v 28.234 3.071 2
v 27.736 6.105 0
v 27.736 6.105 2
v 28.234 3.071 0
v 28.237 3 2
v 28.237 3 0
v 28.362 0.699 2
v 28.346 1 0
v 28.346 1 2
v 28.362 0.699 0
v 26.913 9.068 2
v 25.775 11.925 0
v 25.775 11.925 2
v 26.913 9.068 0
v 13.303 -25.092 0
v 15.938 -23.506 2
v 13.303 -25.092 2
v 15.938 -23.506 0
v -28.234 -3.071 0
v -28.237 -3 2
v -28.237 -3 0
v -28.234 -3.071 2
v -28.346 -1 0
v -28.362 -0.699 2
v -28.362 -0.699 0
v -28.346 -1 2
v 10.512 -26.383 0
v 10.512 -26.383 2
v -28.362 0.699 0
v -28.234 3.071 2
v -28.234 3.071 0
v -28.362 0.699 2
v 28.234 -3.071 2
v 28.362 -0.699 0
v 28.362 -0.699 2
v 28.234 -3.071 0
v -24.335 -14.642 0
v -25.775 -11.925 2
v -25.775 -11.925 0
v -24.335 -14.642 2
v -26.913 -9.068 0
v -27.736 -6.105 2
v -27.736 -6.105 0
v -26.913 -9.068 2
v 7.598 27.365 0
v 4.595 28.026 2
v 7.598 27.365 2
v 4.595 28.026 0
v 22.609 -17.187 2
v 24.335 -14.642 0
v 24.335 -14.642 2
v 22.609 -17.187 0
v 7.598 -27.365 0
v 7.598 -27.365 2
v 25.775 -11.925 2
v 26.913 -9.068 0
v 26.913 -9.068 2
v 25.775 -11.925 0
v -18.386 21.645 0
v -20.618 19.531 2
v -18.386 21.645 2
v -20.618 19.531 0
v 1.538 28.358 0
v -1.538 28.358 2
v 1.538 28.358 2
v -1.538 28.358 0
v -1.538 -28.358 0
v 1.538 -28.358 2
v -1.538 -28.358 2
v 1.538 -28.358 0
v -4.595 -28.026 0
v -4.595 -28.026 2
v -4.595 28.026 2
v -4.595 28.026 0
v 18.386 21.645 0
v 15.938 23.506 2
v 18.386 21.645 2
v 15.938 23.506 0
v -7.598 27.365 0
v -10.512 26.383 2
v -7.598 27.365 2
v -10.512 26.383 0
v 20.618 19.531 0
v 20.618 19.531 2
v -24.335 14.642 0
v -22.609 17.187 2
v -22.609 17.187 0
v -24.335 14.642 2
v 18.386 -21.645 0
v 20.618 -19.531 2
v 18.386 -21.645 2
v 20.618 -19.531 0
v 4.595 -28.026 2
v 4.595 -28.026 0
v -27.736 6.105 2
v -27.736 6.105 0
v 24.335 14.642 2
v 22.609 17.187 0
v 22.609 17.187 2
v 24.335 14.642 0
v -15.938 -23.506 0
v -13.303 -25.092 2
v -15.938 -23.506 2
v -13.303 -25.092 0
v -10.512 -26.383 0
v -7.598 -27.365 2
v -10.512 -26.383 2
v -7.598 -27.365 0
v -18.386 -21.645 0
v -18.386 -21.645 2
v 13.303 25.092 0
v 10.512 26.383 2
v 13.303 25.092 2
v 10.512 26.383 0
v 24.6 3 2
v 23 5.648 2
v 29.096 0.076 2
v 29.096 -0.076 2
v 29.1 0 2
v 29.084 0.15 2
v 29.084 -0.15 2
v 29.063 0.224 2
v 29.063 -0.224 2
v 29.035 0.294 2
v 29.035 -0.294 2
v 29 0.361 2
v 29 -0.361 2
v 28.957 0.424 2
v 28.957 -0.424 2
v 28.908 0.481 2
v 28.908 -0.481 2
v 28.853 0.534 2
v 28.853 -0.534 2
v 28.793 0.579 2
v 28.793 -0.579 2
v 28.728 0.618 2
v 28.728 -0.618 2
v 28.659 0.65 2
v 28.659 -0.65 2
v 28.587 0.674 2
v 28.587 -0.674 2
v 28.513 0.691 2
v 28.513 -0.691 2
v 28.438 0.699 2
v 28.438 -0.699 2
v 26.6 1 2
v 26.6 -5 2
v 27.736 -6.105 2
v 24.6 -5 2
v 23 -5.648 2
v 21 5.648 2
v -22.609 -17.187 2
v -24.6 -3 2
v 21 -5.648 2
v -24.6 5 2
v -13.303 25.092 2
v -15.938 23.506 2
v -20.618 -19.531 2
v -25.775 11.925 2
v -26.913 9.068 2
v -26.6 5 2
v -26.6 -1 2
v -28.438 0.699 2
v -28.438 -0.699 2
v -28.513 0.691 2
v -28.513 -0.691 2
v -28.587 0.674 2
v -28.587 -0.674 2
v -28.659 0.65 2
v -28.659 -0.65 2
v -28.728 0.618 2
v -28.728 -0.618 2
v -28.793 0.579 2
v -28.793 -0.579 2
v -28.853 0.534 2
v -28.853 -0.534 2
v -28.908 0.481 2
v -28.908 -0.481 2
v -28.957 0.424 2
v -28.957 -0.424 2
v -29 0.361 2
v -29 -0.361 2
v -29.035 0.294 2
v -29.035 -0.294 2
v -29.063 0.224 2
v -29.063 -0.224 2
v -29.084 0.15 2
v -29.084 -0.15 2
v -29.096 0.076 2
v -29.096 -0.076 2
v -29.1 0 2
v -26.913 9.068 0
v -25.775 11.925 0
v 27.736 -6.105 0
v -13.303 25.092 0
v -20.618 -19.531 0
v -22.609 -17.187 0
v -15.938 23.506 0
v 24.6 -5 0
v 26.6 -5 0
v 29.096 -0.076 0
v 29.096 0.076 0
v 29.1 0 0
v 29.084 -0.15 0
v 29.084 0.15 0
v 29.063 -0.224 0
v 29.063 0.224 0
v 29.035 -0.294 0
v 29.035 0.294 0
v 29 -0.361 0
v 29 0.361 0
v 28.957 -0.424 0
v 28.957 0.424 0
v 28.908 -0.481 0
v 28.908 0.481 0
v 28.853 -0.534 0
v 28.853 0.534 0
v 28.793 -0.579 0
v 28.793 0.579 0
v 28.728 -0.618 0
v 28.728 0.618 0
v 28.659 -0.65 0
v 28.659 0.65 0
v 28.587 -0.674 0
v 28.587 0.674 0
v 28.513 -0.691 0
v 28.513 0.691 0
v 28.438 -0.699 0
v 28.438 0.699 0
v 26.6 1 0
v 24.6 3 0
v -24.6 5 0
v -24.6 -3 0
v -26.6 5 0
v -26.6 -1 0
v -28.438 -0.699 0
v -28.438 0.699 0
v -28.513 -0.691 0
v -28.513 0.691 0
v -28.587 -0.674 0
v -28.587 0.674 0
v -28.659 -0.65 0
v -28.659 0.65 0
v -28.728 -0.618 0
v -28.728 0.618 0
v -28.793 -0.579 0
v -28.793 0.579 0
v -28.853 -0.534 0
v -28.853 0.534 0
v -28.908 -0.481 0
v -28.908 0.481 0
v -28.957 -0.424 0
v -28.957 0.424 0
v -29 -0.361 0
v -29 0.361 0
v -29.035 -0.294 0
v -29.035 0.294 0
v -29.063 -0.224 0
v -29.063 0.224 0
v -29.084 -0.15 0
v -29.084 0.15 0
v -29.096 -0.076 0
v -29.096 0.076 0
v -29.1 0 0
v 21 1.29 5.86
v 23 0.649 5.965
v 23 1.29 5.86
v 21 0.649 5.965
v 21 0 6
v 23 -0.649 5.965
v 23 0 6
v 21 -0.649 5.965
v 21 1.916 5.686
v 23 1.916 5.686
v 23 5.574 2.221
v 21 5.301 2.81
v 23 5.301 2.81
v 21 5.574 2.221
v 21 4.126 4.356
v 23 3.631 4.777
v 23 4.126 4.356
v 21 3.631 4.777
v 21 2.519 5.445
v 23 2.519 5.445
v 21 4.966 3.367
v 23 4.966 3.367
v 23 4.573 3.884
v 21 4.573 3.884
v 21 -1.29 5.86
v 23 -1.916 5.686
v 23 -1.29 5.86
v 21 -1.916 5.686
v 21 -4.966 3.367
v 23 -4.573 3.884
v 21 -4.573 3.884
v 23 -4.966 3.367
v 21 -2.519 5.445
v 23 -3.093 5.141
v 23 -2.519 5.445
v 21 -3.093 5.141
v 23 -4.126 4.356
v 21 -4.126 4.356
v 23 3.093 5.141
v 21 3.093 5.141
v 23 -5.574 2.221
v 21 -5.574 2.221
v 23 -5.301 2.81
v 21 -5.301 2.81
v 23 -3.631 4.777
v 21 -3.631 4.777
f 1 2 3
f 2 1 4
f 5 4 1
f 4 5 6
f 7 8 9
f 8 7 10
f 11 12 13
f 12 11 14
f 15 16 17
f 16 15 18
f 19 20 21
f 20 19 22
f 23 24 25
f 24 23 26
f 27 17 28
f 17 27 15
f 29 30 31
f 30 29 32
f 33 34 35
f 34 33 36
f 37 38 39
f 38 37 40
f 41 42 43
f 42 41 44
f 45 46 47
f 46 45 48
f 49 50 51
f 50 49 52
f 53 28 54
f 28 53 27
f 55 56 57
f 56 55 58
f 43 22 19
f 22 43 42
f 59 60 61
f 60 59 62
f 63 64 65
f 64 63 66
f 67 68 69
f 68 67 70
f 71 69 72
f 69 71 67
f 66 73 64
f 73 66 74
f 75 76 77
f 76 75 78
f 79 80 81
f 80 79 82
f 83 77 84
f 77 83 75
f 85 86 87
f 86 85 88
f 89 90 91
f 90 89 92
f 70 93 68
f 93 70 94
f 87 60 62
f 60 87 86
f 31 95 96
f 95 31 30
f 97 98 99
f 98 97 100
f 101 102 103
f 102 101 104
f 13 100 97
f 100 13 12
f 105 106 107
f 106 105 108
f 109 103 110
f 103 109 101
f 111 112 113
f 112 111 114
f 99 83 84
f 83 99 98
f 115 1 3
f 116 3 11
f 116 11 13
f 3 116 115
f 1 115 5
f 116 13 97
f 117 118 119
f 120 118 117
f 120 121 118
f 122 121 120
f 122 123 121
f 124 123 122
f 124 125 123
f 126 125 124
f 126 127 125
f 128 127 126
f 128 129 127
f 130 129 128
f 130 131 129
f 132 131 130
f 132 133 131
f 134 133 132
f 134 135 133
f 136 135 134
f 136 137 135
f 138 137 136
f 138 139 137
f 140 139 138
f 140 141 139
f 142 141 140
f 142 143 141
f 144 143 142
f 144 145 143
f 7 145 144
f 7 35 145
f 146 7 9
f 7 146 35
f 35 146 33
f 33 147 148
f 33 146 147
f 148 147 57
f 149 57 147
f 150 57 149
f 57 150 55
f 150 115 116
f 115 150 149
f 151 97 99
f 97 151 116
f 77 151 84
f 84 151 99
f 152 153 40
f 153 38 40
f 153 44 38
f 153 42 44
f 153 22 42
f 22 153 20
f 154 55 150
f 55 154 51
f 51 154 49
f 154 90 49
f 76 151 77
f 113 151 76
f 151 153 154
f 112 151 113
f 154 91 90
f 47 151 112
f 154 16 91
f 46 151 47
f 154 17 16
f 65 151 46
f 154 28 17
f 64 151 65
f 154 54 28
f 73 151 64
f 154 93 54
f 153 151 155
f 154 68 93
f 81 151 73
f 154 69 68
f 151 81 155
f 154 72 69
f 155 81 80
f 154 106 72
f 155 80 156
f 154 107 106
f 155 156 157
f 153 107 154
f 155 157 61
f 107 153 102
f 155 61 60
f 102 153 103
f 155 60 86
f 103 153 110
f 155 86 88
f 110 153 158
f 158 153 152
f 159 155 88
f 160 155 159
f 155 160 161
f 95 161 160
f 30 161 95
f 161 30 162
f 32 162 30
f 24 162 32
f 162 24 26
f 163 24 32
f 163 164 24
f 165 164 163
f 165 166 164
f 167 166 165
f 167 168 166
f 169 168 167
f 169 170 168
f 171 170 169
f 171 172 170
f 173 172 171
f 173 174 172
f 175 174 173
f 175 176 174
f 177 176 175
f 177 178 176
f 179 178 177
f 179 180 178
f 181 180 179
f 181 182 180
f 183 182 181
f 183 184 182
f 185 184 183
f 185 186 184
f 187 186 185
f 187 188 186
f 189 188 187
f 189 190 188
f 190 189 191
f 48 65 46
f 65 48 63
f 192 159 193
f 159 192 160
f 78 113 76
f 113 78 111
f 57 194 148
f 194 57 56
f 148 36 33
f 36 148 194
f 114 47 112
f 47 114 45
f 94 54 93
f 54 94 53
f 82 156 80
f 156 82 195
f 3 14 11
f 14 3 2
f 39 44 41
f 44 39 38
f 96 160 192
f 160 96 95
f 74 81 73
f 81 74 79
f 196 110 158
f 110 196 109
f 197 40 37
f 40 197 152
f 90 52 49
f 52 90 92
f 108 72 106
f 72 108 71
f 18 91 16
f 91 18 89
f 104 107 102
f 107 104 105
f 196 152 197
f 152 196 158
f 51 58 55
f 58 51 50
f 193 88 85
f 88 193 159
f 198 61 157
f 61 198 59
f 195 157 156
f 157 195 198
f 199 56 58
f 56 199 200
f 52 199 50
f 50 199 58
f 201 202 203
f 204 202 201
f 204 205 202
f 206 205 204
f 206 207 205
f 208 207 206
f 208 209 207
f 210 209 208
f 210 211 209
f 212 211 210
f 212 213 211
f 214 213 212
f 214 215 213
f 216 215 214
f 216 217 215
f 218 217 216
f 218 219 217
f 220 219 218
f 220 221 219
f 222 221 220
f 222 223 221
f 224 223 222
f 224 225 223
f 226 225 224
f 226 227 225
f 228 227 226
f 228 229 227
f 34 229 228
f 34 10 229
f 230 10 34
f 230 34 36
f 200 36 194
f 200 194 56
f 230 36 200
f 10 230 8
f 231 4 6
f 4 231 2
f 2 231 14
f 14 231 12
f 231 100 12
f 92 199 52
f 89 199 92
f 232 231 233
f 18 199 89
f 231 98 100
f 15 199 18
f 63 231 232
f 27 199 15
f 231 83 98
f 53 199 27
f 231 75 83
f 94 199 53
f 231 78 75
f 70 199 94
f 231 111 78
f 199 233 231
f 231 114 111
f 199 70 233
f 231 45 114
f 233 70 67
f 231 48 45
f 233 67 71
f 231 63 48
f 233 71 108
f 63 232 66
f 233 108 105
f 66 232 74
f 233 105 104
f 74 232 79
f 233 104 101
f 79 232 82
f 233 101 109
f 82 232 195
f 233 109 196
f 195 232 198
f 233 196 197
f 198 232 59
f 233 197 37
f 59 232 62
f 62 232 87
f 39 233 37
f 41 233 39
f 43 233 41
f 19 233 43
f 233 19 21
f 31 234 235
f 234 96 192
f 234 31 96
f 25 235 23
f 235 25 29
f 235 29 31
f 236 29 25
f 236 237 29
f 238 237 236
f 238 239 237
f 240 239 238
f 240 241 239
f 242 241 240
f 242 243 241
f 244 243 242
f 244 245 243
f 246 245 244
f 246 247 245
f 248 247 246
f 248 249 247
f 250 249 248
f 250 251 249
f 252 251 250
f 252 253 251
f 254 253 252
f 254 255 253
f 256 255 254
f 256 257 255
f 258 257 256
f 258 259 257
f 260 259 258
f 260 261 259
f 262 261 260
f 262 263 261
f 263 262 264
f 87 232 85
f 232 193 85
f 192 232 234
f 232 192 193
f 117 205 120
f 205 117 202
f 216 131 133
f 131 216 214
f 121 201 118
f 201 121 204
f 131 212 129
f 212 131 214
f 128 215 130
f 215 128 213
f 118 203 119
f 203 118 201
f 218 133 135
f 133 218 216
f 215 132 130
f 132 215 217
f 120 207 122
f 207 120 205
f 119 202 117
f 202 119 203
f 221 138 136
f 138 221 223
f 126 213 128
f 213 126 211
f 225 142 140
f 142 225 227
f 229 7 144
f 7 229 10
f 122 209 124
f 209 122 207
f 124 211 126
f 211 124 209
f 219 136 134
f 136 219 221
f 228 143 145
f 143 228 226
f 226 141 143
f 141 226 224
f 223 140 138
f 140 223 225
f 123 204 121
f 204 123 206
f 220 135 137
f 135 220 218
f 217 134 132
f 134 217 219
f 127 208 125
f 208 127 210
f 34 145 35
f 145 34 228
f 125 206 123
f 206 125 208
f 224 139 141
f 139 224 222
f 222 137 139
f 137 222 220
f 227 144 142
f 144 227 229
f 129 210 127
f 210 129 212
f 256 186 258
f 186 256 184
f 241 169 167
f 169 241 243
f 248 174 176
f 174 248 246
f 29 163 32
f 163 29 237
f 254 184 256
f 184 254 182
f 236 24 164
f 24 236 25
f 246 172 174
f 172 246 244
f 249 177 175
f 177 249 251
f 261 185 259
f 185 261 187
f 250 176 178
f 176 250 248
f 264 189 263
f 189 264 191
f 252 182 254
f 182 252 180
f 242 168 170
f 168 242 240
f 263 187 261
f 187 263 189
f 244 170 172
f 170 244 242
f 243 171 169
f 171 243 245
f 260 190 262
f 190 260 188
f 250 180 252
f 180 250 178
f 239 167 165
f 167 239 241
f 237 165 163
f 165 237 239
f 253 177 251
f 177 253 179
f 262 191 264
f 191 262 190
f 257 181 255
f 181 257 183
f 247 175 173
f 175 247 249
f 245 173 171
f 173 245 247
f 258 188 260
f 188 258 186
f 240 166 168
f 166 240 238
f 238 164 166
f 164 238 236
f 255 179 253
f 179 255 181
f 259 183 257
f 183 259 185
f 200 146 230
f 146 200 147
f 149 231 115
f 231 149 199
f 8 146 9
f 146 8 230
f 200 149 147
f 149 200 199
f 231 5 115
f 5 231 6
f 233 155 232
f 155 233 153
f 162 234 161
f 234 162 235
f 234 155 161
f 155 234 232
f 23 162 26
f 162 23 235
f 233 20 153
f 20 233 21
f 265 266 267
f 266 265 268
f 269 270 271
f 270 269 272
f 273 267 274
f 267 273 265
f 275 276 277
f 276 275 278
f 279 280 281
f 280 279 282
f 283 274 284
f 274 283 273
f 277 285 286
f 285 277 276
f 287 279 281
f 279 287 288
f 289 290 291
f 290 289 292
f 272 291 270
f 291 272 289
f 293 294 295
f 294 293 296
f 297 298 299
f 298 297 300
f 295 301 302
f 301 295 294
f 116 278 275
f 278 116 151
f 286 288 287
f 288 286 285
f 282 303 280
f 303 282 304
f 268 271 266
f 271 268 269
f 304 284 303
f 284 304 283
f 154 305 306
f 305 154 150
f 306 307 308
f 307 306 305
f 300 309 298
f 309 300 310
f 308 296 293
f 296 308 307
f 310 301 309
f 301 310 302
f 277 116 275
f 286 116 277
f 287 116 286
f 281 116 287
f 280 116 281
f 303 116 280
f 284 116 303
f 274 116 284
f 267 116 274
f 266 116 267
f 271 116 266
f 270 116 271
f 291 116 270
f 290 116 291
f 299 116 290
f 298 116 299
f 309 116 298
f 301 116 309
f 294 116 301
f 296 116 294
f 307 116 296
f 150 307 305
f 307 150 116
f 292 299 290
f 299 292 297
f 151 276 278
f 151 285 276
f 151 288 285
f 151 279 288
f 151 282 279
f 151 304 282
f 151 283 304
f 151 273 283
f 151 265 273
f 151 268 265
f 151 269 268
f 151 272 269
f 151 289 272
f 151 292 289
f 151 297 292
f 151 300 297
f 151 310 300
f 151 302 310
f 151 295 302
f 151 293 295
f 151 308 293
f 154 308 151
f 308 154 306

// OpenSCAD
//
//clip();

filter_diameter = 58;
reduction_factor = 2;
generate_handle = true;
handle_radius = 6;
// Load a 100x100 pixel image. (images will be automatically stretched to fit) Simple, high contrast images like logos work best.
image_file = "file.dat"; // [image_surface:100x100]


filter_cut(filter_diameter/2,reduction_factor);


module filter_cut(radius, reduction_factor)
{
    $fn=58;
    difference(){
        filter(radius-0.6);
        translate([radius-3.4,-2,0])
            cube([2,6,10], center=true);
        translate([radius-0.9,2,0])
            cube([7,2,10], center=true);
        translate([-(radius-3.4),2,0])
            cube([2,6,10], center=true);
        translate([-(radius-0.9),-2,0])
            cube([7,2,10], center=true);//*/
        resize([radius/reduction_factor,radius/reduction_factor,10]) surface(file=image_file, center=true);
    }
    if (generate_handle) 
    {
        translate([radius-8, 0, 0]) handle(handle_radius);    
    }
}

module handle(handle_radius)
{
    rotate([0,90,0]) difference() {
        cylinder(r=handle_radius, h=2);
        translate([0,-handle_radius,0])cube([handle_radius,2*handle_radius,2]);
    }
}

module filter(radius_transformed) 
{
    cylinder(r=radius_transformed,h=2);
    translate([radius_transformed,0,0])
        cylinder(r=0.7,h=2);
    translate([-radius_transformed,0,0])
        cylinder(r=0.7,h=2);
}
